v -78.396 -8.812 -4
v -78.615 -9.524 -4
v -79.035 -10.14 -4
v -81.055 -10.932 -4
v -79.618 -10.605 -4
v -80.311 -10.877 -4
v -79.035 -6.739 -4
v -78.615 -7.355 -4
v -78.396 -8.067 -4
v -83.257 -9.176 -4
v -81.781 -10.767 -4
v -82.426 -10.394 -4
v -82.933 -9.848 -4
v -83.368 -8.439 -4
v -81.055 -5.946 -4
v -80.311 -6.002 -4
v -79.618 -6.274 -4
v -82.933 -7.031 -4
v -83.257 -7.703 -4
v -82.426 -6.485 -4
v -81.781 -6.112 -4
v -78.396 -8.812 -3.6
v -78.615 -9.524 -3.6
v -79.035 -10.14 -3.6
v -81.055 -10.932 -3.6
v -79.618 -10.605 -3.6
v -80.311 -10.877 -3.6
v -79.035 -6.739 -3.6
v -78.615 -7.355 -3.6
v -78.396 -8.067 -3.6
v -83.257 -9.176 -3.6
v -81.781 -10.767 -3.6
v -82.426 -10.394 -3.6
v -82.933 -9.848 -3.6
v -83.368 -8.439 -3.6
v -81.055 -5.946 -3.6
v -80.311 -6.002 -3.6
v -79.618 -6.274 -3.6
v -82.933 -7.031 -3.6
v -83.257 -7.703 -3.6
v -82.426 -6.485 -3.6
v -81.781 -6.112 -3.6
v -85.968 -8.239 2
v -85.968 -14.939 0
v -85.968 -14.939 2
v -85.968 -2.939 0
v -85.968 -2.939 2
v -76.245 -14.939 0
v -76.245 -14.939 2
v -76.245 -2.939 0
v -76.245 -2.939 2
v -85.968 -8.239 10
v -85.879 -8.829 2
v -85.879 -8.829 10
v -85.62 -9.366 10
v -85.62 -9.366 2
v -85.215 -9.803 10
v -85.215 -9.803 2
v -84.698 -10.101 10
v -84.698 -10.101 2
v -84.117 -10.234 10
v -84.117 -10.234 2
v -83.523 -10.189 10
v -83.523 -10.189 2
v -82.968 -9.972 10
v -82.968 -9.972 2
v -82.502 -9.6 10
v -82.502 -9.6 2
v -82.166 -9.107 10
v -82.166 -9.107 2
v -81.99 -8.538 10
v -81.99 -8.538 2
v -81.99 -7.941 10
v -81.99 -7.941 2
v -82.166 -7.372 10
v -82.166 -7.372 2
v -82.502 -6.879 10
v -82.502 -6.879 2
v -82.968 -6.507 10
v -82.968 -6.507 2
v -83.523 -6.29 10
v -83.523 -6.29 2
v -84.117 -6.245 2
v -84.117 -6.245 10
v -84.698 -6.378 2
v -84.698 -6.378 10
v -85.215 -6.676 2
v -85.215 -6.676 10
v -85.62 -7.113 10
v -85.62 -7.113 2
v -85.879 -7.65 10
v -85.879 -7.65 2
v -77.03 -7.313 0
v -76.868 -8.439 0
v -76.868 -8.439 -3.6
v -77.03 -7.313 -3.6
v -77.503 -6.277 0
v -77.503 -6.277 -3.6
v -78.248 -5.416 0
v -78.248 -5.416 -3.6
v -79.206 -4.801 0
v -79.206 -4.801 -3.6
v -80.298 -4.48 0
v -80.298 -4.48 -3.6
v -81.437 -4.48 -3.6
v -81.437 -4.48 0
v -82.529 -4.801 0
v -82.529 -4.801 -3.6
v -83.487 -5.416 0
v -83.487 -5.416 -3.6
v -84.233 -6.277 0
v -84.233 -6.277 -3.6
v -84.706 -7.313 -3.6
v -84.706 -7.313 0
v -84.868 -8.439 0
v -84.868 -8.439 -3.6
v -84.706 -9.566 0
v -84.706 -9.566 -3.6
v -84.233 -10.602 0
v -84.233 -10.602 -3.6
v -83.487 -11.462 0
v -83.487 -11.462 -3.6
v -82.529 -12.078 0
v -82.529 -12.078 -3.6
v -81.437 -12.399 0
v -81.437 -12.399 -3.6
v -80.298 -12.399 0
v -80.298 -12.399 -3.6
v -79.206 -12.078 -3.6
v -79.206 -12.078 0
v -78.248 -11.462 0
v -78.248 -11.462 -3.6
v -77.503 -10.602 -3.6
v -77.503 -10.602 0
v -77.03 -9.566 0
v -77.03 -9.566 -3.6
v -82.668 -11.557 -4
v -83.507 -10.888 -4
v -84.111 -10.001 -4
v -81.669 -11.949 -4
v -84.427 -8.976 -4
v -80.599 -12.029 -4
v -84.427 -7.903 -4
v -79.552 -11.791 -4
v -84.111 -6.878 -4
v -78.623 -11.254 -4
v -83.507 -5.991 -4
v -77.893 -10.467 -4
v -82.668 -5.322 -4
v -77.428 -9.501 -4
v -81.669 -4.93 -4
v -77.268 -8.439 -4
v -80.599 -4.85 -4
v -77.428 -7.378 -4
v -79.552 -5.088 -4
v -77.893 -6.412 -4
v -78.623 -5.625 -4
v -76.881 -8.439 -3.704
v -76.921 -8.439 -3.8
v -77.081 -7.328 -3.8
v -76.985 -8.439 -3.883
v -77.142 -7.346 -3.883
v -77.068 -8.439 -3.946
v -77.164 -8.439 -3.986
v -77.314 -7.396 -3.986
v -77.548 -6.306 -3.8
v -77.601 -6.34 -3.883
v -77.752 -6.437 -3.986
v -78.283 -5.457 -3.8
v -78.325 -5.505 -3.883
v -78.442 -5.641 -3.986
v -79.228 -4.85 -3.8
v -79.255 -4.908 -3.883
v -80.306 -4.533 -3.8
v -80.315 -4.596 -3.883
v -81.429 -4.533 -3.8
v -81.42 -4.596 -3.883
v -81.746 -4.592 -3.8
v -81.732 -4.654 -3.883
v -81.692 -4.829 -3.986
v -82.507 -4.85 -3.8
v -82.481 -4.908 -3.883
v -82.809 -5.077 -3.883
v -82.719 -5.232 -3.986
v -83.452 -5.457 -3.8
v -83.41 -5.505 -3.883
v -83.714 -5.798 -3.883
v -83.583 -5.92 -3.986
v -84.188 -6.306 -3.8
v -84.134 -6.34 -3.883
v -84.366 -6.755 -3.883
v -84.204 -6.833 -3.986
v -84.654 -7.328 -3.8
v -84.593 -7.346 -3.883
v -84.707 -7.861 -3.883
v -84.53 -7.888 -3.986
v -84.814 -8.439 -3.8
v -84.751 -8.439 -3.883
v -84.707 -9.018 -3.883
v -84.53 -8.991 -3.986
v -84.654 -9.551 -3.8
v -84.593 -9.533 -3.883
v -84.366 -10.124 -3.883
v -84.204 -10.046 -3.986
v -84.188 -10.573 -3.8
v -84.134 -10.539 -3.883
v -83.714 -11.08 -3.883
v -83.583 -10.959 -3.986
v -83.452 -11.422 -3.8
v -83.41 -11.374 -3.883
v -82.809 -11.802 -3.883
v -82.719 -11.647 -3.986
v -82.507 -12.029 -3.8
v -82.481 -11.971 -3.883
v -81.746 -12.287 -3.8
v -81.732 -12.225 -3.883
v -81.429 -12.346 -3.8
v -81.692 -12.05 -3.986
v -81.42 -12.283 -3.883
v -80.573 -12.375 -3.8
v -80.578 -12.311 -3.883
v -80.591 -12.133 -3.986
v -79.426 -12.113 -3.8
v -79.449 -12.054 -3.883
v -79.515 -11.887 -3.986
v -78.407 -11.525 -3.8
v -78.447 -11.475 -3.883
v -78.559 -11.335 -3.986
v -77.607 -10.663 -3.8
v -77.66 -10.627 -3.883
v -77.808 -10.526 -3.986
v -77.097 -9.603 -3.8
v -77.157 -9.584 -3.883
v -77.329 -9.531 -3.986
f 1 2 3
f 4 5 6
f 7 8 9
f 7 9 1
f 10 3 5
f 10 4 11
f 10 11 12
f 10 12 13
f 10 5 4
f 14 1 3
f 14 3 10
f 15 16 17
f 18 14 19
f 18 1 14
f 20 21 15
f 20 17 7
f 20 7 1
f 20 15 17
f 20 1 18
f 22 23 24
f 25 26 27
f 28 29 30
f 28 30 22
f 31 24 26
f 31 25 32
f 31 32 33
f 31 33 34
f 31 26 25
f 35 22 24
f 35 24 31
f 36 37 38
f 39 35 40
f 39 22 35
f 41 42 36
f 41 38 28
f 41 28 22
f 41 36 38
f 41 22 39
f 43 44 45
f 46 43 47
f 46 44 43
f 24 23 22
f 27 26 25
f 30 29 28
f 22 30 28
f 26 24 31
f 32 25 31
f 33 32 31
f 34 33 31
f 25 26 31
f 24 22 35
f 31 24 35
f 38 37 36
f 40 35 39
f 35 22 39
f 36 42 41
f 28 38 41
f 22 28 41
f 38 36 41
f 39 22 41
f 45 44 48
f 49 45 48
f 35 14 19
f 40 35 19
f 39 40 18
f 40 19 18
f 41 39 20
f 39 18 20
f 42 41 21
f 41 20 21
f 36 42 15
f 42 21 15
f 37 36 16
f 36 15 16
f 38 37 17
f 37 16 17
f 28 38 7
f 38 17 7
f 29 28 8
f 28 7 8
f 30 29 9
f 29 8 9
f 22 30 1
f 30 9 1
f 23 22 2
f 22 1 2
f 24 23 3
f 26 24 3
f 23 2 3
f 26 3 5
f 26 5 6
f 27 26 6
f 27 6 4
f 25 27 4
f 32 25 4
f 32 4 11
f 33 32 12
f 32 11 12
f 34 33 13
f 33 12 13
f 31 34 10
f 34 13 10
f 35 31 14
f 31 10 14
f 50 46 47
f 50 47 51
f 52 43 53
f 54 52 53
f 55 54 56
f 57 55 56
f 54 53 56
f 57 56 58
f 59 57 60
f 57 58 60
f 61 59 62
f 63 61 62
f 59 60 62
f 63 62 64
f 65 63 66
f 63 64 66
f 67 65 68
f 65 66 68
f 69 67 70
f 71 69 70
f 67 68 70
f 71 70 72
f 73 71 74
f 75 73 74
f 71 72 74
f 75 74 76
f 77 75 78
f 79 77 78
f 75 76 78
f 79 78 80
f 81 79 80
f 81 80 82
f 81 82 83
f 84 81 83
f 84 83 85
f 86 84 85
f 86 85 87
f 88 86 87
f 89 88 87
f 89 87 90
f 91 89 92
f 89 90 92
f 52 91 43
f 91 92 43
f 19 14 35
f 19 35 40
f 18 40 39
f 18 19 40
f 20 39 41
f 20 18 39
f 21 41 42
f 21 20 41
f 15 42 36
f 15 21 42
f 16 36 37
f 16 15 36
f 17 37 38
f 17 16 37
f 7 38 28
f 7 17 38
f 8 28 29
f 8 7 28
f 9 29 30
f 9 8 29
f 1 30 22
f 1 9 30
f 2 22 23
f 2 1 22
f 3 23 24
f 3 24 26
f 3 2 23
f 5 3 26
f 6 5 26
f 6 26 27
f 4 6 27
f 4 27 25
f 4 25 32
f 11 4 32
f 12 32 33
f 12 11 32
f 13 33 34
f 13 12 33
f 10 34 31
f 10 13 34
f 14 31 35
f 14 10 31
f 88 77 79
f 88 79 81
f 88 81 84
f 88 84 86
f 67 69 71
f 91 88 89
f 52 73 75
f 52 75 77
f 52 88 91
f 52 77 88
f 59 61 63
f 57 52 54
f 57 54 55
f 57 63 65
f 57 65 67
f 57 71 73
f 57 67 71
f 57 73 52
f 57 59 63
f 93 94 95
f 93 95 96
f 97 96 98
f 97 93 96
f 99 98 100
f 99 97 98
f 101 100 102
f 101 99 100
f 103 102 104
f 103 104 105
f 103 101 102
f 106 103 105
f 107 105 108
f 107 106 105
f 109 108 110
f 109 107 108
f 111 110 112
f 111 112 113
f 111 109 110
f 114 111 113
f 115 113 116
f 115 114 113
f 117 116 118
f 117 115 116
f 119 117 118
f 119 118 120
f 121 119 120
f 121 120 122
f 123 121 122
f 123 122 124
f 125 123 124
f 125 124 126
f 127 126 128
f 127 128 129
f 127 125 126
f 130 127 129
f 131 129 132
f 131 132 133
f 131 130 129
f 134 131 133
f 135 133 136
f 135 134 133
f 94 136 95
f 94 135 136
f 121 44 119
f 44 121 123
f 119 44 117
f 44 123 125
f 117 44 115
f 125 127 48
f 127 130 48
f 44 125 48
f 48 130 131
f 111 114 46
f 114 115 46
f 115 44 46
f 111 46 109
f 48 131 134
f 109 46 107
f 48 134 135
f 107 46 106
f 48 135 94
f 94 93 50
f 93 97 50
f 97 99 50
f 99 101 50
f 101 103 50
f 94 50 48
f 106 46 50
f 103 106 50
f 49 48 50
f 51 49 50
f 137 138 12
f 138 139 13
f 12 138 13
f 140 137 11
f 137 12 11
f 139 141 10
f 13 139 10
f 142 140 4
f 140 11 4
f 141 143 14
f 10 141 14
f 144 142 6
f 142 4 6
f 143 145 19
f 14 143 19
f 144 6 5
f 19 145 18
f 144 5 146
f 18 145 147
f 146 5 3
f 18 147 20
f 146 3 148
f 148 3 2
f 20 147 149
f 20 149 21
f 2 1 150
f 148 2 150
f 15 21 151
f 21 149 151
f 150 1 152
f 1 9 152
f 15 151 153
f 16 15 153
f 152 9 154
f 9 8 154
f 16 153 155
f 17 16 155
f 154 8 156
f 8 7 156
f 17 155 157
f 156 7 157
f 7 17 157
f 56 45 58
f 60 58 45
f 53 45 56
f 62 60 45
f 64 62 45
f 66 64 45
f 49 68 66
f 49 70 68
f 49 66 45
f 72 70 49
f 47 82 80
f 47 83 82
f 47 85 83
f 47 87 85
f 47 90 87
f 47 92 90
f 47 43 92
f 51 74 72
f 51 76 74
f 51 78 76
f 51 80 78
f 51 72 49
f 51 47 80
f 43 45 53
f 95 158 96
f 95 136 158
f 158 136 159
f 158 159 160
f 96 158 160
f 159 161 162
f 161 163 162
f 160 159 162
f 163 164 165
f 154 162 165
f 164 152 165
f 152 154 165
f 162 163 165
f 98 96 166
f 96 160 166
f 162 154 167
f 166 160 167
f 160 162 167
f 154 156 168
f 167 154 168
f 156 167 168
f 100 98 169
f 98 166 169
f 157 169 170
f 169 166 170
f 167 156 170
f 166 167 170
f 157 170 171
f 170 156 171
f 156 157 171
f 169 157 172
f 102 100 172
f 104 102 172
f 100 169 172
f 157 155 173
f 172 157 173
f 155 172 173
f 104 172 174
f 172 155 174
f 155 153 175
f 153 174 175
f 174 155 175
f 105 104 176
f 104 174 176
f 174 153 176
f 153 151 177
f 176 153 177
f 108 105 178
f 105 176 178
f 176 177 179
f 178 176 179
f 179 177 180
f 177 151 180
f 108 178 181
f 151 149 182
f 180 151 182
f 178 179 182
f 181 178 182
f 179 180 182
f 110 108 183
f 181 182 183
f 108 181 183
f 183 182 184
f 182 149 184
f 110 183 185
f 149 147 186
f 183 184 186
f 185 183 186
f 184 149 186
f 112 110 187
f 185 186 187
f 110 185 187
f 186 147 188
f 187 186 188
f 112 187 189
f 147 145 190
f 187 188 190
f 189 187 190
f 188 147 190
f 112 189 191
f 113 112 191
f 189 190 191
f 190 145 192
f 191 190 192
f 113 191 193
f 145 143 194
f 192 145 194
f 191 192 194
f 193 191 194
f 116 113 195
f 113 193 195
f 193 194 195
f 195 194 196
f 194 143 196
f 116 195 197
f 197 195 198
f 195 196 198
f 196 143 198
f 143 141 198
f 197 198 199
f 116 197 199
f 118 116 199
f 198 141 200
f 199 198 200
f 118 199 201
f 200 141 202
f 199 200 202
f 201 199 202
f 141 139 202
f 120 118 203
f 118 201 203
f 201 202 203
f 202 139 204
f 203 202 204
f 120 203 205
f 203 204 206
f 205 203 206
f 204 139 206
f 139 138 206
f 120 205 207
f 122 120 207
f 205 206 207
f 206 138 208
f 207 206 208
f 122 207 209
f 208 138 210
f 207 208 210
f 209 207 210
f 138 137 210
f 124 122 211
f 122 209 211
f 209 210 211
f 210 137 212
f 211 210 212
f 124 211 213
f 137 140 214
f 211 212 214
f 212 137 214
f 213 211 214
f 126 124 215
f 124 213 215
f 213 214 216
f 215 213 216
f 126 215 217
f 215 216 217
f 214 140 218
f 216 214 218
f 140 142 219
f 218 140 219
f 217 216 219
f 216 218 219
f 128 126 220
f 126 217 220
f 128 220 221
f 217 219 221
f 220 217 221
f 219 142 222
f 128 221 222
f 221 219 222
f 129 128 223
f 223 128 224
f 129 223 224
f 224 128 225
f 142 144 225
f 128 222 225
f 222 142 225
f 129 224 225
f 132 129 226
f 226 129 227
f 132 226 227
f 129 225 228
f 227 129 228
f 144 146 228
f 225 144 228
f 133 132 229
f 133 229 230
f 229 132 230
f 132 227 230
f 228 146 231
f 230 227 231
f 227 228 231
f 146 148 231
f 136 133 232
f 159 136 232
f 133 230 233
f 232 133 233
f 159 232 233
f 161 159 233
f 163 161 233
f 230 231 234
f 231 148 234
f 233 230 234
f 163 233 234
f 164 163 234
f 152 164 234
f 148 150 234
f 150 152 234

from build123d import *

# Parameters (mm, degrees)
SKIZZE2_R                       = 4
AUFSATZ_LINEAR_AUSTRAGEN1_DEPTH = 4
SKIZZE3_W                       = 9.723167254
SKIZZE3_H                       = 12
AUFSATZ_LINEAR_AUSTRAGEN2_DEPTH = 2
VERRUNDUNG1_R                   = 0.4
SKIZZE5_R                       = 2
AUFSATZ_LINEAR_AUSTRAGEN4_DEPTH = 8
SKIZZE4_R                       = 2.5
SCHNITT_LINEAR_AUSTRAGEN1_DEPTH = 0.4
SKIZZE4_5_R                     = 2.5
AUFSATZ_LINEAR_AUSTRAGEN5_DEPTH = 0.4


with BuildPart() as part:
    # Skizze2 → Aufsatz-Linear austragen1 (new body)
    with BuildSketch(Plane.XY):
        with Locations((-80.86767695, -8.439487313)):
            Circle(SKIZZE2_R)
    extrude(amount=-AUFSATZ_LINEAR_AUSTRAGEN1_DEPTH)

    # Skizze3 → Aufsatz-Linear austragen2 (add)
    with BuildSketch(Plane.XY):
        with Locations((-81.106093323, -8.939487313)):
            Rectangle(SKIZZE3_W, SKIZZE3_H)
    extrude(amount=AUFSATZ_LINEAR_AUSTRAGEN2_DEPTH)

    # Verrundung1
    verrundung1_edges = [part.edges().sort_by_distance(p)[0] for p in [
        (-84.86767695, -8.439487313, -4),
    ]]
    fillet(verrundung1_edges, radius=VERRUNDUNG1_R)

    # Skizze5 → Aufsatz-Linear austragen4 (add)
    with BuildSketch(Plane.XY.offset(2)):
        with Locations((-83.96767695, -8.239487313)):
            Circle(SKIZZE5_R)
    extrude(amount=AUFSATZ_LINEAR_AUSTRAGEN4_DEPTH)

    # Skizze4 → Schnitt-Linear austragen1 (cut)
    with BuildSketch(Plane(origin=(0, 0, -4), x_dir=(-1, 0, 0), z_dir=(0, 0, -1))):
        with Locations((80.86767695, -8.439487313)):
            Circle(SKIZZE4_R)
    extrude(amount=-SCHNITT_LINEAR_AUSTRAGEN1_DEPTH, mode=Mode.SUBTRACT)


with BuildPart() as body_2:
    # Skizze4<5> → Aufsatz-Linear austragen5 (new body)
    with BuildSketch(Plane(origin=(0, 0, -4), x_dir=(-1, 0, 0), z_dir=(0, 0, -1))):
        with Locations((80.86767695, -8.439487313)):
            Circle(SKIZZE4_5_R)
    extrude(amount=-AUFSATZ_LINEAR_AUSTRAGEN5_DEPTH)


solid = Compound([part.part, body_2.part])
